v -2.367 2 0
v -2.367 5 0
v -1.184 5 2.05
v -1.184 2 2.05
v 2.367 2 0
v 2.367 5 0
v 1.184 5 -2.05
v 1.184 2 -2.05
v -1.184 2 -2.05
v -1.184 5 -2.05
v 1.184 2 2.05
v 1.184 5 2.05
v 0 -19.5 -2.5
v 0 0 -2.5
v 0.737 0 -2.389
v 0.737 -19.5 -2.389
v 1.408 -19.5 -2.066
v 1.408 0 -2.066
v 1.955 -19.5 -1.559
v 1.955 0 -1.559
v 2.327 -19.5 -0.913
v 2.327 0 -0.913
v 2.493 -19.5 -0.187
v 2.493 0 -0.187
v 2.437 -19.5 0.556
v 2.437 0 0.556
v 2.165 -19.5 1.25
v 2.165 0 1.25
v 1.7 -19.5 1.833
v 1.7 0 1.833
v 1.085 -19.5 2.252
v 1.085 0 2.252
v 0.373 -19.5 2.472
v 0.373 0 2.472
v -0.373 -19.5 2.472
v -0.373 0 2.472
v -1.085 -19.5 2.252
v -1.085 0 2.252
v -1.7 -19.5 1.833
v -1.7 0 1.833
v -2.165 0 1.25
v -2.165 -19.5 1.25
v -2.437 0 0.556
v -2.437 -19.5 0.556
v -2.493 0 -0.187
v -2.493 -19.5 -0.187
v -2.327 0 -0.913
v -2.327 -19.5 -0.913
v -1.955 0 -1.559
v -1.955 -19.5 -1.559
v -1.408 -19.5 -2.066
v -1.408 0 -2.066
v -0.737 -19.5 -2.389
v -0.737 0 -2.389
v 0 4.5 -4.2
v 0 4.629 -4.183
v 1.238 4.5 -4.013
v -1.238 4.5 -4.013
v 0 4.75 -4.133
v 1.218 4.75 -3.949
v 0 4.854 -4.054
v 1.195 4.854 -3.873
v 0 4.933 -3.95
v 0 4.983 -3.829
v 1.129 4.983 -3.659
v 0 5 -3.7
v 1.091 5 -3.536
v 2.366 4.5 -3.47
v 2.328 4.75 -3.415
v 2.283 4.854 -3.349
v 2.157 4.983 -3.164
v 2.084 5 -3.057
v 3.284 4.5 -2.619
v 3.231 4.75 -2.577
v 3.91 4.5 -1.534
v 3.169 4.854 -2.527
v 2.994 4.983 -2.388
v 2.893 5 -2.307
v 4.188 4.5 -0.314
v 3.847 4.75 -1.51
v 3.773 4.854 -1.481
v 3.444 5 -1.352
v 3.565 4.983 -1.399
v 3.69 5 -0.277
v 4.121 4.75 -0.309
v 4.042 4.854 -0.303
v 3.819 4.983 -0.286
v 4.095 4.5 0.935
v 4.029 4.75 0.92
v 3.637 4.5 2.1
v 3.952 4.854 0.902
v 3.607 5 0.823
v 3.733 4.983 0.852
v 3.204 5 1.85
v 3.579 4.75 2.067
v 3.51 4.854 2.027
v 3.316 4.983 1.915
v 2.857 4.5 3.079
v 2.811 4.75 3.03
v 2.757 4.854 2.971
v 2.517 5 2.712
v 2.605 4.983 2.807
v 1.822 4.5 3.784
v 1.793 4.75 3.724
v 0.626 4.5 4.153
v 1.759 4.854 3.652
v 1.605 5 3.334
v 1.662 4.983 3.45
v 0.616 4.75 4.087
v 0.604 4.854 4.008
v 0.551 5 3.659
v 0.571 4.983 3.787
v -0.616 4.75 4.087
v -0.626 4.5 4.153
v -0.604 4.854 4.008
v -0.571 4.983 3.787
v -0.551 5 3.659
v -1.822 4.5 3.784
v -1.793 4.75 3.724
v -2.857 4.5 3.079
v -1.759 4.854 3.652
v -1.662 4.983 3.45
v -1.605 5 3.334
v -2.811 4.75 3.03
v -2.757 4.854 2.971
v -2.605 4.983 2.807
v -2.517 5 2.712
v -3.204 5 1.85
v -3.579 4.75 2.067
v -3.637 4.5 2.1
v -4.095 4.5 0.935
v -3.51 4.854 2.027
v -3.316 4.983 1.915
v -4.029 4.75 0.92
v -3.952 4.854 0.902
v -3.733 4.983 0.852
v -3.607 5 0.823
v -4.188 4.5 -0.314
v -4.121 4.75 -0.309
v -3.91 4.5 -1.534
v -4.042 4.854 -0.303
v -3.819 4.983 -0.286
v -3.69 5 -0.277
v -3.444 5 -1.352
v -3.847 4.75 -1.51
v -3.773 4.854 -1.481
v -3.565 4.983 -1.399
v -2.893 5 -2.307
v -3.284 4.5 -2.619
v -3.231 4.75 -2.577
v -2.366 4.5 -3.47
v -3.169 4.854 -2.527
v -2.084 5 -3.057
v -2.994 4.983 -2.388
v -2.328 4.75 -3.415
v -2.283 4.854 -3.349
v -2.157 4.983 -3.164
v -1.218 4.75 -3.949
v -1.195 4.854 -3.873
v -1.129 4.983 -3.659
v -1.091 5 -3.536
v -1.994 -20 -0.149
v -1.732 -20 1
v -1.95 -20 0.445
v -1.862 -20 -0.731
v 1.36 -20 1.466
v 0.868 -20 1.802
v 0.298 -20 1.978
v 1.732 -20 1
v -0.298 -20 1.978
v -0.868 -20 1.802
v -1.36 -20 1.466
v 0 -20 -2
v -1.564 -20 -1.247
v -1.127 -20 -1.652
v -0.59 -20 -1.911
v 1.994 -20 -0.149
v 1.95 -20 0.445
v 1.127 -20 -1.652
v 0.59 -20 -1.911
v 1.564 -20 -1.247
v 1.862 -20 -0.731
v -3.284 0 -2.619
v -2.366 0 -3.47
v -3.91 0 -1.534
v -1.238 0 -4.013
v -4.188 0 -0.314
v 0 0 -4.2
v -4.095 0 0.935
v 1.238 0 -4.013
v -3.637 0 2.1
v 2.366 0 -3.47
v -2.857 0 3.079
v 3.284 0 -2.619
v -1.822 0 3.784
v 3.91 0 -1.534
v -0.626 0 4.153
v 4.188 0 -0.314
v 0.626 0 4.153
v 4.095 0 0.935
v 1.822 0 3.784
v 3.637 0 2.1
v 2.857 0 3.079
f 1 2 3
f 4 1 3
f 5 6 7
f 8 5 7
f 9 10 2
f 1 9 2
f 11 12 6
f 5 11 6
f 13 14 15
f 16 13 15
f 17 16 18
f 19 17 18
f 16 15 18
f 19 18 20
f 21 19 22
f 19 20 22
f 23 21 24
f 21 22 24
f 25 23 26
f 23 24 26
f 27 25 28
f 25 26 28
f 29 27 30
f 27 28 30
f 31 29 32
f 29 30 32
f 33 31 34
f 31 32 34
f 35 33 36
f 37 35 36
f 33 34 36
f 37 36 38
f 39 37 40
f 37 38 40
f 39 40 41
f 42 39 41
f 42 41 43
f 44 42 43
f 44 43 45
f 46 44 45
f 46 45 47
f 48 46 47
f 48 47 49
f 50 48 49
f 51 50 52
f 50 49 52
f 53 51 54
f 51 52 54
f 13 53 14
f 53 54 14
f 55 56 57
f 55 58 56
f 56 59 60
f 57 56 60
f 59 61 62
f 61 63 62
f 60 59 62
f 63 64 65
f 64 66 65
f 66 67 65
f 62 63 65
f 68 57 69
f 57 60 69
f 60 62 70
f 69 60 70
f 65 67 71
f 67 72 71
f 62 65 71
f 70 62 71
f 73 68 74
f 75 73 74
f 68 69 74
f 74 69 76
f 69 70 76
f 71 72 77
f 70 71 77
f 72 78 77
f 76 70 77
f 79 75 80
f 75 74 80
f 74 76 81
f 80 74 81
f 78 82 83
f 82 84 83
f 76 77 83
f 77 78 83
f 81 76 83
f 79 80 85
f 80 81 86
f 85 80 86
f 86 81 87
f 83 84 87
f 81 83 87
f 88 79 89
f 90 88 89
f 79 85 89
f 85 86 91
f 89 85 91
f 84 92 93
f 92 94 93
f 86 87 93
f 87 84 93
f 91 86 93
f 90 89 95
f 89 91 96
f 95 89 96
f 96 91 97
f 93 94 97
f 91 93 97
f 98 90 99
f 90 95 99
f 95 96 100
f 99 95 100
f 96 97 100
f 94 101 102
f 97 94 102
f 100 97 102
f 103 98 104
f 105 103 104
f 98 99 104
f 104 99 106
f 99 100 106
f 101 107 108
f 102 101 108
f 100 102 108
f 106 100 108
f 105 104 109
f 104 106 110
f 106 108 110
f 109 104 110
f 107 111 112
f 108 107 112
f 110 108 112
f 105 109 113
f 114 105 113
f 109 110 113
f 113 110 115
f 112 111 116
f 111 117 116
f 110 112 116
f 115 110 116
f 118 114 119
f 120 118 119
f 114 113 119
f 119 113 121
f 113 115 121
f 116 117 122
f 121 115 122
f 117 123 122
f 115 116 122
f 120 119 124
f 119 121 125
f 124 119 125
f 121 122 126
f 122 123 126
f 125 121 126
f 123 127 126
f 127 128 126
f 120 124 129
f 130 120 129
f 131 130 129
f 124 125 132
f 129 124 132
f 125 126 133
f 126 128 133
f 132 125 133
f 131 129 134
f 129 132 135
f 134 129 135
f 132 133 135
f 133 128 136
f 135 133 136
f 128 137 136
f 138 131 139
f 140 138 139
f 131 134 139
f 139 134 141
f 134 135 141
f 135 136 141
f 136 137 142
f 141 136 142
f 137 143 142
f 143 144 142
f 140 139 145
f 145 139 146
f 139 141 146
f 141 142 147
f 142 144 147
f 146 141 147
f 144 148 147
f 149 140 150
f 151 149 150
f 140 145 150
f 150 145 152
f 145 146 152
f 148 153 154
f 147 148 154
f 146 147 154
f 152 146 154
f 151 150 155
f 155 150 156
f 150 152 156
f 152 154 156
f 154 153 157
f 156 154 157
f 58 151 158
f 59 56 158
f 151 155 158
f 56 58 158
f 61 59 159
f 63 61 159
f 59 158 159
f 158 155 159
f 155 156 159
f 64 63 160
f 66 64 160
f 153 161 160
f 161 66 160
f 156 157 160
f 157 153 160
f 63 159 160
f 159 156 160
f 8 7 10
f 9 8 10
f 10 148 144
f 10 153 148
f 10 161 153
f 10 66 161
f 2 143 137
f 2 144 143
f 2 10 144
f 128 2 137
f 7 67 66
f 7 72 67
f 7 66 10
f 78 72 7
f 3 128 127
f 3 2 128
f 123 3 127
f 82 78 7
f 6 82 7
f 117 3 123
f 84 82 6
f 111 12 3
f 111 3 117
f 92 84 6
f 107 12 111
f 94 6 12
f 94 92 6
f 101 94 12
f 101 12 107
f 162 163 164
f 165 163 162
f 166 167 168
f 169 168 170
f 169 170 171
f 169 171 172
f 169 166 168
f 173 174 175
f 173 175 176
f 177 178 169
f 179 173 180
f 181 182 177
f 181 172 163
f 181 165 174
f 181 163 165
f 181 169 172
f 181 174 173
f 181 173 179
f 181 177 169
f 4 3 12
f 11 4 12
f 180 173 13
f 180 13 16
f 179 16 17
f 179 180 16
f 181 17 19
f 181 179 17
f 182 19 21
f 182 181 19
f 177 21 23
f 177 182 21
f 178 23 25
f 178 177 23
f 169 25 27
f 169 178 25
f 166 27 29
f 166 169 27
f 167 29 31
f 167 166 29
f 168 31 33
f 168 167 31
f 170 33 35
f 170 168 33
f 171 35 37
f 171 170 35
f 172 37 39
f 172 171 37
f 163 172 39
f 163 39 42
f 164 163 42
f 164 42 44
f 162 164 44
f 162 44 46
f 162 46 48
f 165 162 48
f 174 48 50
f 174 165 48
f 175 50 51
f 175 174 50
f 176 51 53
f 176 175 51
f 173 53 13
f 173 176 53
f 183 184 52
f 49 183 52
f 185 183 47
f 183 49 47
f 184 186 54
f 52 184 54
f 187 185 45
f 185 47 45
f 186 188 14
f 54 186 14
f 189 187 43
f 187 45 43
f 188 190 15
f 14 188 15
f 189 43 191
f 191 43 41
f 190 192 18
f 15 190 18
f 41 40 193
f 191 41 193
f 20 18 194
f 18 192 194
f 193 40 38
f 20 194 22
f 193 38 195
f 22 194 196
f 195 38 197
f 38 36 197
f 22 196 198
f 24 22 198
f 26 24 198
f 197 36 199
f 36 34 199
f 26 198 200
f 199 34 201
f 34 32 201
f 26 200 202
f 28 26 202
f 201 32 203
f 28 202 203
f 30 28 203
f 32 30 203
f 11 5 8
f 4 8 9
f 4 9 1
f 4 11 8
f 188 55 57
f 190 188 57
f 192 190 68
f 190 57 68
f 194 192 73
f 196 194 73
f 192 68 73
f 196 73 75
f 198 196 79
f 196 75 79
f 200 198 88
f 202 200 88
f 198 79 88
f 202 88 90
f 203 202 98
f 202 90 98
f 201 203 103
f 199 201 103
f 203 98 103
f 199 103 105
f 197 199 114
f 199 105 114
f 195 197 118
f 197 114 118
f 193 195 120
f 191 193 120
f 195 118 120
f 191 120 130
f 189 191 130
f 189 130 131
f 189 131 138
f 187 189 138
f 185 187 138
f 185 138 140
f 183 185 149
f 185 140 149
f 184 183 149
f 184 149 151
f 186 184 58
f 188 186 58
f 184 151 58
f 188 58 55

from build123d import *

# Parameters (mm, degrees)
ESQUISSE1_W             = 4.2
ESQUISSE1_H             = 5
ESQUISSE2_R             = 2.5
BOSS_EXTRU_1_DEPTH      = 20
ENL_V_MAT_EXTRU_1_DEPTH = 3
CHANFREIN1_SIZE         = 0.5
CONG_1_R                = 0.5


with BuildPart() as part:
    # Esquisse1 → Révolution1 (revolve)
    with BuildSketch(Plane.XY, mode=Mode.PRIVATE) as r_volution1_sk:
        with Locations((2.1, 2.5)):
            Rectangle(ESQUISSE1_W, ESQUISSE1_H)
    revolve(r_volution1_sk.sketch.rotate(Axis((0, 5, 0), (0, -1, 0)), 270), axis=Axis((0, 5, 0), (0, -1, 0)))

    # Esquisse2 → Boss.-Extru.1 (add)
    with BuildSketch(Plane.XZ):
        with Locations(Location((0, 0, 0), (0, 0, 270))):
            Circle(ESQUISSE2_R)
    extrude(amount=BOSS_EXTRU_1_DEPTH)

    # Esquisse3 → Enlèv. mat.-Extru.1 (cut)
    with BuildSketch(Plane(origin=(0, 5, 0), x_dir=(-1, 0, 0), z_dir=(0, 1, 0))):
        Polygon((1.183568052, 2.05), (-1.183568052, 2.05), (-2.367136104, 0), (-1.183568052, -2.05), (1.183568052, -2.05), (2.367136104, 0), align=None)
    extrude(amount=-ENL_V_MAT_EXTRU_1_DEPTH, mode=Mode.SUBTRACT)

    # Chanfrein1
    chanfrein1_edges = [part.edges().sort_by_distance(p)[0] for p in [
        (0, -20, 2.5),
    ]]
    chamfer(chanfrein1_edges, length=CHANFREIN1_SIZE)

    # Congé1
    cong_1_edges = [part.edges().sort_by_distance(p)[0] for p in [
        (0, 5, 4.2),
    ]]
    fillet(cong_1_edges, radius=CONG_1_R)


solid = part.part
